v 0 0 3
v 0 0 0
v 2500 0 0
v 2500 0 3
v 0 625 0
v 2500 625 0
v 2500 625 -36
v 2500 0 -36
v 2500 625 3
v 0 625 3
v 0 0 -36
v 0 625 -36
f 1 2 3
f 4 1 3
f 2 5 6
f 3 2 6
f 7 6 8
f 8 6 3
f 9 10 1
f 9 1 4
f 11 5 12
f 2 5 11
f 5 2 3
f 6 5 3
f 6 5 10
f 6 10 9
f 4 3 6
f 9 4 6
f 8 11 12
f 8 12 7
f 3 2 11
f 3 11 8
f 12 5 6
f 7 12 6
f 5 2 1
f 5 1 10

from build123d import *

# Parameters (mm, degrees)
F0_W      = 2500
F0_H      = 625
F1_DEPTH  = 3
F1_FACE_W = 2500
F1_FACE_H = 625
F2_DEPTH  = 36


with BuildPart() as f1:
    # F0 (on Top) → F1 (new body)
    with BuildSketch(Plane.XY):
        with Locations((1250, 312.5)):
            Rectangle(F0_W, F0_H)
    extrude(amount=F1_DEPTH)


with BuildPart() as f2:
    # F1_face (on face) → F2 (new body)
    with BuildSketch(Plane(origin=(1250, 312.5, 0), x_dir=(1, 0, 0), z_dir=(0, 0, -1))):
        Rectangle(F1_FACE_W, F1_FACE_H)
    extrude(amount=F2_DEPTH)


solid = Compound([f1.part, f2.part])
